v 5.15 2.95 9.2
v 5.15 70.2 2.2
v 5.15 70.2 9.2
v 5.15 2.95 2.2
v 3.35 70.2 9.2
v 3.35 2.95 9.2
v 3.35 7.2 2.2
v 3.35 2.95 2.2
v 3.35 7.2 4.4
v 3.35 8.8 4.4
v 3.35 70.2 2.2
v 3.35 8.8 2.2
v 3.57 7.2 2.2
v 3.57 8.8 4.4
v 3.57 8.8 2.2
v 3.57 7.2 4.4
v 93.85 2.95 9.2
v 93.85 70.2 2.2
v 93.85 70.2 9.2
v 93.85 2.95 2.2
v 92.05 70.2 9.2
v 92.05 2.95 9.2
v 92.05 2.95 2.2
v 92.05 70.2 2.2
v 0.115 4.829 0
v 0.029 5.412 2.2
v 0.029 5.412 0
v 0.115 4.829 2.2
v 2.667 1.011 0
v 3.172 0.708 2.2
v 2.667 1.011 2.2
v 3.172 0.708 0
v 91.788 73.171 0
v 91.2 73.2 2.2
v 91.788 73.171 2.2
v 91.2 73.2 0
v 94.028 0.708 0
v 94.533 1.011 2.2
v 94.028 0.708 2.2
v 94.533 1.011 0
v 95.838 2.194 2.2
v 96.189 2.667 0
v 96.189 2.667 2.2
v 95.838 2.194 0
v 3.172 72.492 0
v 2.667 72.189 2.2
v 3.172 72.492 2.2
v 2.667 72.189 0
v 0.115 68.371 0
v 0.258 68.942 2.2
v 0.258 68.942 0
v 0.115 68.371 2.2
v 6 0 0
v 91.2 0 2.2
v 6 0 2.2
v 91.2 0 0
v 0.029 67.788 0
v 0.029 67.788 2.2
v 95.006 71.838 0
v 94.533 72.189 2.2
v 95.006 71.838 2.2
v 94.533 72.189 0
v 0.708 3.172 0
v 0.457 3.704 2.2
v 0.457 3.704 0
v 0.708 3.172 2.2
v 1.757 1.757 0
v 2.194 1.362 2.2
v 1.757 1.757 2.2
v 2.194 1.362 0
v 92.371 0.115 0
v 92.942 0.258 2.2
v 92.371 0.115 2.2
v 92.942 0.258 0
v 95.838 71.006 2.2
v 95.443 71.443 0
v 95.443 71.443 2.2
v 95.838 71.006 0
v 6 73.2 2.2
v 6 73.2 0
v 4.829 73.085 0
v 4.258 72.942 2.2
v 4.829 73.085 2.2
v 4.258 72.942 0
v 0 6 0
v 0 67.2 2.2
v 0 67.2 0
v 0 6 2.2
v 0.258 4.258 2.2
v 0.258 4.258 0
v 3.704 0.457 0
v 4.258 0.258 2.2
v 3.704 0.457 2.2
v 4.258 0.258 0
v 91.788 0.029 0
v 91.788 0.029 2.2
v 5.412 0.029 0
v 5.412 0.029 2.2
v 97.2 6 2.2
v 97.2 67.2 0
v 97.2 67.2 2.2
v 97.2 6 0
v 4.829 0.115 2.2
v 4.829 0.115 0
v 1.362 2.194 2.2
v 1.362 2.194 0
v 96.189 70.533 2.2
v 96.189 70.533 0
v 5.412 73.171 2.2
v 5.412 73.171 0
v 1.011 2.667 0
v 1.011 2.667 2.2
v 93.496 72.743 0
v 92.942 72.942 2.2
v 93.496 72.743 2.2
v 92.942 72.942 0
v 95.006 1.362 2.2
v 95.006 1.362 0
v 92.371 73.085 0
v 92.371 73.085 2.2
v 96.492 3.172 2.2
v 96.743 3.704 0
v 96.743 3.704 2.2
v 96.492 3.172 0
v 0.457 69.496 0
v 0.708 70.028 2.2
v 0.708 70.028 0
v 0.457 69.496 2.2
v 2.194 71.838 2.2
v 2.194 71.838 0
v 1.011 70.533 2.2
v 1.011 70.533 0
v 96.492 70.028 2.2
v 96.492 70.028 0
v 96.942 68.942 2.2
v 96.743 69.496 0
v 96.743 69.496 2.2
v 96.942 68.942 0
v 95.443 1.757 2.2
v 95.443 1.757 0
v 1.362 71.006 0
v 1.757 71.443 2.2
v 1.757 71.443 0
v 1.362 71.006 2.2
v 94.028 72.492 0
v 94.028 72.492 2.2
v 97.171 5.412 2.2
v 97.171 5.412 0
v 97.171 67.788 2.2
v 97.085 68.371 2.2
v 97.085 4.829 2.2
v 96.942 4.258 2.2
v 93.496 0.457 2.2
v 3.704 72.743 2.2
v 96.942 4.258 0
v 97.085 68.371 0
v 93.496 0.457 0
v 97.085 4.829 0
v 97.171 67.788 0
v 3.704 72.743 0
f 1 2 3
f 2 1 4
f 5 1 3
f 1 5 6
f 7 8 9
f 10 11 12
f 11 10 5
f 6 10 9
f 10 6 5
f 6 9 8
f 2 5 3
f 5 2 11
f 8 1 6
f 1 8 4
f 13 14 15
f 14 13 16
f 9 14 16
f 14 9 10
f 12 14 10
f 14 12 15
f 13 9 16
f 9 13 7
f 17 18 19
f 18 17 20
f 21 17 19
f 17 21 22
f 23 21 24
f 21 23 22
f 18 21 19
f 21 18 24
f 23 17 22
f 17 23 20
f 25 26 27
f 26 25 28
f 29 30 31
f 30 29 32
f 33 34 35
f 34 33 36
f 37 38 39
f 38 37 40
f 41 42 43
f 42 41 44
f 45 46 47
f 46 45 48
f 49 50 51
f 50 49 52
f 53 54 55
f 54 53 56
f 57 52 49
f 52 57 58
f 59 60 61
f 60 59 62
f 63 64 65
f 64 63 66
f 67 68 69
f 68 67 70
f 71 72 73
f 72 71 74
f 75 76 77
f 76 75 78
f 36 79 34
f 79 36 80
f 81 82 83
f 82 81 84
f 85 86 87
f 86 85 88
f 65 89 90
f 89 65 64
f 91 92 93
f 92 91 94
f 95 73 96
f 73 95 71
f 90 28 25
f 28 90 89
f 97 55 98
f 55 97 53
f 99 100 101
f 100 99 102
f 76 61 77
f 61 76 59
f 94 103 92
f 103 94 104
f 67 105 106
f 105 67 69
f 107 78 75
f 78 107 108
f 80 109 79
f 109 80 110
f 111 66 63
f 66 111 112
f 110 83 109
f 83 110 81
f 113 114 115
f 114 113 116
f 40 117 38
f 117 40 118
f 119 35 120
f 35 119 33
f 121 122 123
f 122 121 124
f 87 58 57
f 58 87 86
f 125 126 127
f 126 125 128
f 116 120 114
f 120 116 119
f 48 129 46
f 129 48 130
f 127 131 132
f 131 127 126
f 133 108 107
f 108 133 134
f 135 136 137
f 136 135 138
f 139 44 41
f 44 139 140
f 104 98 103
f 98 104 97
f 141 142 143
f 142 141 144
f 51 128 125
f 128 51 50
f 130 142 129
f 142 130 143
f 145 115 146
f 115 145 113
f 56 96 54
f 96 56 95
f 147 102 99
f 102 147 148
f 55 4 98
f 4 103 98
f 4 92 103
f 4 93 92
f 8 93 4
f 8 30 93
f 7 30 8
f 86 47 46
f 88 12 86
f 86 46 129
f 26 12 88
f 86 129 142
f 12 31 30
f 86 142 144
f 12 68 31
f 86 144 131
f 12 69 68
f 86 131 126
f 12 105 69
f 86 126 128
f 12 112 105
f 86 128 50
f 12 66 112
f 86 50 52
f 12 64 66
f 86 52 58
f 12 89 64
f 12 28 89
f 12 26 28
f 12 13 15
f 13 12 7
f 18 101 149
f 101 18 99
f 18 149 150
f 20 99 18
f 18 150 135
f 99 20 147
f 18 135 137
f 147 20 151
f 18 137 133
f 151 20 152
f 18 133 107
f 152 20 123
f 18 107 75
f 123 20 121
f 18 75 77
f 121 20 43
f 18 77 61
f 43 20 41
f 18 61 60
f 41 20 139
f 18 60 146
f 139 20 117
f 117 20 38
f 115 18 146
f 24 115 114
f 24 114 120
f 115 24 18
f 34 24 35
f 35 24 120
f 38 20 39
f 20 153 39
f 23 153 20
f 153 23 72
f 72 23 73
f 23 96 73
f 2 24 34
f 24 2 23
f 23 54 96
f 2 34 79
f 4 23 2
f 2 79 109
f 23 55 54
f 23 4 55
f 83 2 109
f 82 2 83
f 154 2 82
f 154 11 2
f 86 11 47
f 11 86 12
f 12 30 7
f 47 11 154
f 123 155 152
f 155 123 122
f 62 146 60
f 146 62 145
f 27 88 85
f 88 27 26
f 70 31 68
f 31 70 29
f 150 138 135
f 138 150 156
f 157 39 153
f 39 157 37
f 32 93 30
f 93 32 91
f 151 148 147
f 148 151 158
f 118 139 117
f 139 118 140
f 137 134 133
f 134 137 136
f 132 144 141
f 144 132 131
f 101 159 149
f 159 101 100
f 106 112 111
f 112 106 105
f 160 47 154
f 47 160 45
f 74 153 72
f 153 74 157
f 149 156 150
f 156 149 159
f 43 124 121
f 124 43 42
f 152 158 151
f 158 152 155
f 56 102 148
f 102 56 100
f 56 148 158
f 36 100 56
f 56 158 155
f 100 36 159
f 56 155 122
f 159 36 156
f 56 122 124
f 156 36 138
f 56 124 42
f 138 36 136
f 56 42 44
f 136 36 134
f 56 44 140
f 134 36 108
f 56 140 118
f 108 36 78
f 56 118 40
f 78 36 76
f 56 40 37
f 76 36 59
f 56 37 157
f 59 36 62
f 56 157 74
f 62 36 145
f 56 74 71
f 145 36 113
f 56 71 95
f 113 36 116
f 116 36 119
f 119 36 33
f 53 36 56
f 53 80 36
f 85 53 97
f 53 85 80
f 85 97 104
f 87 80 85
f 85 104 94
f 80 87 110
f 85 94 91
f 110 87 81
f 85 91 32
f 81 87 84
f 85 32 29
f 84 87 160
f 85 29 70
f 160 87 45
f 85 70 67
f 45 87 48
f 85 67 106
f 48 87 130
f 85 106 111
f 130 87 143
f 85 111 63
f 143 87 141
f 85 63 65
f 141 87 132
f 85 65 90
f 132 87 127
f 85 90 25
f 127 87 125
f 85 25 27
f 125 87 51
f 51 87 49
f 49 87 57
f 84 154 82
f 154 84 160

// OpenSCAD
// Orange Pi tablet base board enclosure - rev 3
// Board size target: 90 mm x 66 mm
// Changes in this revision:
//   - Corner-only PCB standoffs
//   - Standoffs start near the base floor instead of lifting the PCB very high
//   - PCB is screwed to the bottom shell
//   - Top cover is screwless and slides into rails in the bottom shell
//
// Export assembled view, separate printable parts, or single-part exports.

show_mode = "lid";   // "assembly", "layout", "base", "lid"
explode = 10;        // spacing used by the side-by-side layout preview
assembly_slide_offset = 0;

// -----------------------------
// User-tunable dimensions
// -----------------------------
board_x = 90;
board_y = 66;
board_thickness = 1.6;

// Fit / clearance
board_clearance_xy = 1.2;      // total extra space around PCB footprint; keeps at least 90 x 66 mm from standoff edge to opposite wall
board_edge_capture = 0.0;      // keep disabled; screw-mounted PCB does not need tiny anti-rattle tabs

// Shell
wall = 3.0;
corner_r = 6.0;
bottom_thickness = 2.6;
lid_thickness = 2.2;

// PCB mounting height
// Keep 8 mm from the inner floor to the PCB underside for the M.2 drive.
underside_clearance = 8.0;     // distance from inner floor to underside of PCB
standoff_extra_h = 0.15;       // tiny preload so board sits firmly

// Space above PCB for components / lid
topside_clearance = 15.5;

// Sliding lid system
rail_height = 2.2;
rail_width = 1.8;
rail_gap = 0.35;
lid_insert_depth = 7.0;
lid_stop_depth = 2.0;
lid_has_detent = true;
lid_detent_d = 1.2;
lid_detent_protrusion = 0.38;
lid_detent_pocket_depth = 0.22;
lid_detent_pocket_len = 1.6;
lid_detent_y = wall + lid_stop_depth + 3.0;

// Windows / access openings
long_window_margin = 7;
short_window_margin = 7;
window_floor_margin = 3.0;
long_window_roof_margin = 3.0;   // printable top band along the long walls
short_window_roof_margin = 3.0;  // keep more material on the rail side walls
min_long_window_clearance_above_board = 16.0;

// PCB mounting
// Corner-based pattern. Baseline hole centers are 2.5 mm inboard from the PCB edges.
pcb_corner_inset_x = 2.5;
pcb_corner_inset_y = 2.5;
// In the top-view landscape orientation, the top-left hole is the left/high-Y corner.
pcb_tl_extra_inset_x = 0.0;
pcb_tl_extra_inset_y = 0.0;
pcb_tr_extra_inset_x = 0.0;
pcb_tr_extra_inset_y = 0.0;
pcb_bl_extra_inset_x = 0.0;
pcb_bl_extra_inset_y = 1.5;
pcb_br_extra_inset_x = 0.0;
pcb_br_extra_inset_y = 0.0;
pcb_hole_d = 2.5;              // measured PCB mounting hole diameter
pcb_screw_pilot_d = 1.9;       // M2 pilot for a screw threading into printed plastic
pcb_screw_bottom_margin = 1.2; // keep the outer floor closed under the blind standoff hole
standoff_d = 8.0;

// Vent pattern
lid_has_vents = false;
vent_slot_x = 4;
vent_slot_y = 18;
vent_spacing_x = 8;
vent_spacing_y = 11;
vent_cols = 7;
vent_rows = 3;

// -----------------------------
// Derived dimensions
// -----------------------------
inner_x = board_x + board_clearance_xy;
inner_y = board_y + board_clearance_xy;
outer_x = inner_x + 2*wall;
outer_y = inner_y + 2*wall;
pcb_tl_inset_x = pcb_corner_inset_x + pcb_tl_extra_inset_x;
pcb_tl_inset_y = pcb_corner_inset_y + pcb_tl_extra_inset_y;
pcb_tr_inset_x = pcb_corner_inset_x + pcb_tr_extra_inset_x;
pcb_tr_inset_y = pcb_corner_inset_y + pcb_tr_extra_inset_y;
pcb_bl_inset_x = pcb_corner_inset_x + pcb_bl_extra_inset_x;
pcb_bl_inset_y = pcb_corner_inset_y + pcb_bl_extra_inset_y;
pcb_br_inset_x = pcb_corner_inset_x + pcb_br_extra_inset_x;
pcb_br_inset_y = pcb_corner_inset_y + pcb_br_extra_inset_y;
max_corner_inset_x = max(max(pcb_tl_inset_x, pcb_tr_inset_x), max(pcb_bl_inset_x, pcb_br_inset_x));
max_corner_inset_y = max(max(pcb_tl_inset_y, pcb_tr_inset_y), max(pcb_bl_inset_y, pcb_br_inset_y));
left_mount_inset_x = max(pcb_tl_inset_x, pcb_bl_inset_x);
right_mount_inset_x = max(pcb_tr_inset_x, pcb_br_inset_x);
top_mount_inset_y = max(pcb_tl_inset_y, pcb_tr_inset_y);
bottom_mount_inset_y = max(pcb_bl_inset_y, pcb_br_inset_y);
board_room_from_standoff_x = board_x + board_clearance_xy/2 - max_corner_inset_x + standoff_d/2;
board_room_from_standoff_y = board_y + board_clearance_xy/2 - max_corner_inset_y + standoff_d/2;

board_x0 = (outer_x - board_x)/2;
board_y0 = (outer_y - board_y)/2;
board_z = bottom_thickness + underside_clearance;
board_top_z = board_z + board_thickness;
base_h = board_z + board_thickness + topside_clearance + rail_height + 1.6;
lid_h = lid_thickness + lid_insert_depth;
join_eps = 0.05;
top_drop_in_x = inner_x;
top_drop_in_y = inner_y;
long_window_clearance_above_board = base_h - long_window_roof_margin - board_top_z;
window_standoff_keepout = 0.8;
long_window_margin_eff = max(long_window_margin, board_x0 + max(left_mount_inset_x, right_mount_inset_x) + standoff_d/2 + window_standoff_keepout);
short_window_margin_eff = max(short_window_margin, board_y0 + max(top_mount_inset_y, bottom_mount_inset_y) + standoff_d/2 + window_standoff_keepout);

$fn = 64;

assert(standoff_d > pcb_screw_pilot_d, "standoff_d must be larger than pcb_screw_pilot_d");
assert(lid_insert_depth > rail_height, "lid_insert_depth must exceed rail_height to capture the lid rails");
assert(!lid_has_detent || lid_detent_protrusion > rail_gap, "lid_detent_protrusion must exceed rail_gap to create a detent");
assert(!lid_has_detent || lid_detent_pocket_depth > lid_detent_protrusion - rail_gap, "lid_detent_pocket_depth must be deeper than the detent interference");
assert(!lid_has_detent || (lid_detent_y > wall && lid_detent_y < wall + inner_y), "lid_detent_y must fall on the runner span");
assert(board_room_from_standoff_x >= board_x, "Increase board_clearance_xy to keep 90 mm from standoff edge to opposite wall");
assert(board_room_from_standoff_y >= board_y, "Increase board_clearance_xy to keep 66 mm from standoff edge to opposite wall");
assert(top_drop_in_x >= board_x, "Top opening must stay at least 90 mm wide for clean drop-in");
assert(top_drop_in_y >= board_y, "Top opening must stay at least 66 mm deep for clean drop-in");
assert(long_window_clearance_above_board >= min_long_window_clearance_above_board, "Increase case height to keep at least 16 mm of long-side port access above the PCB");
assert(2*long_window_margin_eff < outer_x, "Long-side windows leave no remaining opening");
assert(2*short_window_margin_eff < outer_y, "Short-side windows leave no remaining opening");
assert(board_z + standoff_extra_h > pcb_screw_bottom_margin, "Blind screw hole bottom margin is taller than the standoff");

module rounded_box(size=[10,10,10], r=2) {
    sx = size[0]; sy = size[1]; sz = size[2];
    hull() {
        for (x = [r, sx-r])
            for (y = [r, sy-r])
                translate([x,y,0]) cylinder(h=sz, r=r);
    }
}

module pcb_hole_positions() {
    translate([board_x0 + pcb_tl_inset_x, board_y0 + pcb_tl_inset_y, 0]) children();
    translate([board_x0 + board_x - pcb_tr_inset_x, board_y0 + pcb_tr_inset_y, 0]) children();
    translate([board_x0 + pcb_bl_inset_x, board_y0 + board_y - pcb_bl_inset_y, 0]) children();
    translate([board_x0 + board_x - pcb_br_inset_x, board_y0 + board_y - pcb_br_inset_y, 0]) children();
}

module base_side_rails() {
    // Keep the lid rails inside the wall thickness so the top opening stays clear.
    translate([wall - rail_width - join_eps, wall, base_h - rail_height])
        cube([rail_width + join_eps, inner_y, rail_height]);
    translate([outer_x - wall, wall, base_h - rail_height])
        cube([rail_width + join_eps, inner_y, rail_height]);
    if (lid_has_detent)
        // Single-side detent reduces the chance of both rails binding at once.
        translate([wall + lid_detent_protrusion - lid_detent_d/2, lid_detent_y, base_h - rail_height - join_eps])
            cylinder(h=rail_height + 2*join_eps, d=lid_detent_d);
}

module board_edge_nibs() {
    nib_w = 6;
    nib_d = board_edge_capture;
    nib_h = 1.2;

    if (nib_d > 0)
    for (xx = [board_x0 + 14, board_x0 + board_x - 14 - nib_w]) {
        translate([xx, board_y0 - nib_d - join_eps, board_z + board_thickness - nib_h])
            cube([nib_w, nib_d + join_eps, nib_h]);
        translate([xx, board_y0 + board_y - join_eps, board_z + board_thickness - nib_h])
            cube([nib_w, nib_d + join_eps, nib_h]);
    }
}

module standoffs() {
    standoff_h = board_z + standoff_extra_h;
    pcb_hole_positions() cylinder(h=standoff_h, d=standoff_d);
}

module standoff_holes() {
    standoff_h = board_z + standoff_extra_h;
    pilot_h = standoff_h - pcb_screw_bottom_margin;
    pcb_hole_positions()
        translate([0,0,standoff_h - pilot_h])
            cylinder(h=pilot_h + 0.1, d=pcb_screw_pilot_d);
}

module base_shell() {
    difference() {
        union() {
            difference() {
                rounded_box([outer_x, outer_y, base_h], corner_r);

                // Open-top shell with a preserved floor.
                translate([wall, wall, bottom_thickness])
                    cube([inner_x, inner_y, base_h - bottom_thickness + 0.2]);

                // long-side windows
                long_len = outer_x - 2*long_window_margin_eff;
                long_h = base_h - window_floor_margin - long_window_roof_margin;
                translate([long_window_margin_eff, -0.1, window_floor_margin])
                    cube([long_len, wall+0.2, long_h]);
                translate([long_window_margin_eff, outer_y-wall-0.1, window_floor_margin])
                    cube([long_len, wall+0.2, long_h]);

                // short-side windows
                short_len = outer_y - 2*short_window_margin_eff;
                short_h = base_h - window_floor_margin - short_window_roof_margin - rail_height;
                translate([-0.1, short_window_margin_eff, window_floor_margin])
                    cube([wall+0.2, short_len, short_h]);
                translate([outer_x-wall-0.1, short_window_margin_eff, window_floor_margin])
                    cube([wall+0.2, short_len, short_h]);
            }

            standoffs();
            base_side_rails();
            board_edge_nibs();
        }

        standoff_holes();
    }
}

module lid_runner(x0, has_detent=false) {
    runner_len = inner_y;
    difference() {
        translate([x0, wall - join_eps, lid_thickness - join_eps])
            cube([rail_width, runner_len + join_eps, lid_insert_depth + join_eps]);
        if (has_detent && lid_has_detent)
            translate([x0 - join_eps, lid_detent_y - lid_detent_pocket_len/2, lid_thickness - join_eps])
                cube([lid_detent_pocket_depth + join_eps, lid_detent_pocket_len, rail_height + join_eps]);
    }
}

module lid_runners() {
    lid_runner(wall + rail_gap, true);
    lid_runner(outer_x - wall - rail_width - rail_gap);
}

module lid_shell() {
    difference() {
        union() {
            rounded_box([outer_x, outer_y, lid_thickness], corner_r);
            lid_runners();
        }

        if (lid_has_vents)
            for (ix = [0:vent_cols-1])
                for (iy = [0:vent_rows-1]) {
                    vx = outer_x/2 - ((vent_cols-1)*vent_spacing_x)/2 + ix*vent_spacing_x;
                    vy = outer_y/2 - ((vent_rows-1)*vent_spacing_y)/2 + iy*vent_spacing_y;
                    translate([vx - vent_slot_x/2, vy - vent_slot_y/2, -0.1])
                        cube([vent_slot_x, vent_slot_y, lid_thickness + 0.2]);
                }
    }
}

module pcb_mock() {
    color([0.0,0.45,0.1,1])
    translate([board_x0, board_y0, board_z])
        cube([board_x, board_y, board_thickness]);
    color([0.9,0.8,0.2,1])
    pcb_hole_positions()
        translate([0,0,board_z]) cylinder(h=board_thickness, d=pcb_hole_d);
}

module assembled_case() {
    color([0.20,0.20,0.22,1.0]) base_shell();
    pcb_mock();
    translate([0, outer_y - assembly_slide_offset, base_h + lid_thickness])
        rotate([180,0,0])
            color([0.25,0.25,0.28,1.0]) lid_shell();
}

module layout_case() {
    layout_gap = max(explode, 12);
    color([0.20,0.20,0.22,1.0]) base_shell();
    translate([outer_x + layout_gap, outer_y, lid_h])
        rotate([180,0,0])
            color([0.25,0.25,0.28,1.0]) lid_shell();
}

if (show_mode == "assembly") {
    assembled_case();
} else if (show_mode == "layout") {
    layout_case();
} else if (show_mode == "base") {
    base_shell();
} else if (show_mode == "lid") {
    lid_shell();
}
